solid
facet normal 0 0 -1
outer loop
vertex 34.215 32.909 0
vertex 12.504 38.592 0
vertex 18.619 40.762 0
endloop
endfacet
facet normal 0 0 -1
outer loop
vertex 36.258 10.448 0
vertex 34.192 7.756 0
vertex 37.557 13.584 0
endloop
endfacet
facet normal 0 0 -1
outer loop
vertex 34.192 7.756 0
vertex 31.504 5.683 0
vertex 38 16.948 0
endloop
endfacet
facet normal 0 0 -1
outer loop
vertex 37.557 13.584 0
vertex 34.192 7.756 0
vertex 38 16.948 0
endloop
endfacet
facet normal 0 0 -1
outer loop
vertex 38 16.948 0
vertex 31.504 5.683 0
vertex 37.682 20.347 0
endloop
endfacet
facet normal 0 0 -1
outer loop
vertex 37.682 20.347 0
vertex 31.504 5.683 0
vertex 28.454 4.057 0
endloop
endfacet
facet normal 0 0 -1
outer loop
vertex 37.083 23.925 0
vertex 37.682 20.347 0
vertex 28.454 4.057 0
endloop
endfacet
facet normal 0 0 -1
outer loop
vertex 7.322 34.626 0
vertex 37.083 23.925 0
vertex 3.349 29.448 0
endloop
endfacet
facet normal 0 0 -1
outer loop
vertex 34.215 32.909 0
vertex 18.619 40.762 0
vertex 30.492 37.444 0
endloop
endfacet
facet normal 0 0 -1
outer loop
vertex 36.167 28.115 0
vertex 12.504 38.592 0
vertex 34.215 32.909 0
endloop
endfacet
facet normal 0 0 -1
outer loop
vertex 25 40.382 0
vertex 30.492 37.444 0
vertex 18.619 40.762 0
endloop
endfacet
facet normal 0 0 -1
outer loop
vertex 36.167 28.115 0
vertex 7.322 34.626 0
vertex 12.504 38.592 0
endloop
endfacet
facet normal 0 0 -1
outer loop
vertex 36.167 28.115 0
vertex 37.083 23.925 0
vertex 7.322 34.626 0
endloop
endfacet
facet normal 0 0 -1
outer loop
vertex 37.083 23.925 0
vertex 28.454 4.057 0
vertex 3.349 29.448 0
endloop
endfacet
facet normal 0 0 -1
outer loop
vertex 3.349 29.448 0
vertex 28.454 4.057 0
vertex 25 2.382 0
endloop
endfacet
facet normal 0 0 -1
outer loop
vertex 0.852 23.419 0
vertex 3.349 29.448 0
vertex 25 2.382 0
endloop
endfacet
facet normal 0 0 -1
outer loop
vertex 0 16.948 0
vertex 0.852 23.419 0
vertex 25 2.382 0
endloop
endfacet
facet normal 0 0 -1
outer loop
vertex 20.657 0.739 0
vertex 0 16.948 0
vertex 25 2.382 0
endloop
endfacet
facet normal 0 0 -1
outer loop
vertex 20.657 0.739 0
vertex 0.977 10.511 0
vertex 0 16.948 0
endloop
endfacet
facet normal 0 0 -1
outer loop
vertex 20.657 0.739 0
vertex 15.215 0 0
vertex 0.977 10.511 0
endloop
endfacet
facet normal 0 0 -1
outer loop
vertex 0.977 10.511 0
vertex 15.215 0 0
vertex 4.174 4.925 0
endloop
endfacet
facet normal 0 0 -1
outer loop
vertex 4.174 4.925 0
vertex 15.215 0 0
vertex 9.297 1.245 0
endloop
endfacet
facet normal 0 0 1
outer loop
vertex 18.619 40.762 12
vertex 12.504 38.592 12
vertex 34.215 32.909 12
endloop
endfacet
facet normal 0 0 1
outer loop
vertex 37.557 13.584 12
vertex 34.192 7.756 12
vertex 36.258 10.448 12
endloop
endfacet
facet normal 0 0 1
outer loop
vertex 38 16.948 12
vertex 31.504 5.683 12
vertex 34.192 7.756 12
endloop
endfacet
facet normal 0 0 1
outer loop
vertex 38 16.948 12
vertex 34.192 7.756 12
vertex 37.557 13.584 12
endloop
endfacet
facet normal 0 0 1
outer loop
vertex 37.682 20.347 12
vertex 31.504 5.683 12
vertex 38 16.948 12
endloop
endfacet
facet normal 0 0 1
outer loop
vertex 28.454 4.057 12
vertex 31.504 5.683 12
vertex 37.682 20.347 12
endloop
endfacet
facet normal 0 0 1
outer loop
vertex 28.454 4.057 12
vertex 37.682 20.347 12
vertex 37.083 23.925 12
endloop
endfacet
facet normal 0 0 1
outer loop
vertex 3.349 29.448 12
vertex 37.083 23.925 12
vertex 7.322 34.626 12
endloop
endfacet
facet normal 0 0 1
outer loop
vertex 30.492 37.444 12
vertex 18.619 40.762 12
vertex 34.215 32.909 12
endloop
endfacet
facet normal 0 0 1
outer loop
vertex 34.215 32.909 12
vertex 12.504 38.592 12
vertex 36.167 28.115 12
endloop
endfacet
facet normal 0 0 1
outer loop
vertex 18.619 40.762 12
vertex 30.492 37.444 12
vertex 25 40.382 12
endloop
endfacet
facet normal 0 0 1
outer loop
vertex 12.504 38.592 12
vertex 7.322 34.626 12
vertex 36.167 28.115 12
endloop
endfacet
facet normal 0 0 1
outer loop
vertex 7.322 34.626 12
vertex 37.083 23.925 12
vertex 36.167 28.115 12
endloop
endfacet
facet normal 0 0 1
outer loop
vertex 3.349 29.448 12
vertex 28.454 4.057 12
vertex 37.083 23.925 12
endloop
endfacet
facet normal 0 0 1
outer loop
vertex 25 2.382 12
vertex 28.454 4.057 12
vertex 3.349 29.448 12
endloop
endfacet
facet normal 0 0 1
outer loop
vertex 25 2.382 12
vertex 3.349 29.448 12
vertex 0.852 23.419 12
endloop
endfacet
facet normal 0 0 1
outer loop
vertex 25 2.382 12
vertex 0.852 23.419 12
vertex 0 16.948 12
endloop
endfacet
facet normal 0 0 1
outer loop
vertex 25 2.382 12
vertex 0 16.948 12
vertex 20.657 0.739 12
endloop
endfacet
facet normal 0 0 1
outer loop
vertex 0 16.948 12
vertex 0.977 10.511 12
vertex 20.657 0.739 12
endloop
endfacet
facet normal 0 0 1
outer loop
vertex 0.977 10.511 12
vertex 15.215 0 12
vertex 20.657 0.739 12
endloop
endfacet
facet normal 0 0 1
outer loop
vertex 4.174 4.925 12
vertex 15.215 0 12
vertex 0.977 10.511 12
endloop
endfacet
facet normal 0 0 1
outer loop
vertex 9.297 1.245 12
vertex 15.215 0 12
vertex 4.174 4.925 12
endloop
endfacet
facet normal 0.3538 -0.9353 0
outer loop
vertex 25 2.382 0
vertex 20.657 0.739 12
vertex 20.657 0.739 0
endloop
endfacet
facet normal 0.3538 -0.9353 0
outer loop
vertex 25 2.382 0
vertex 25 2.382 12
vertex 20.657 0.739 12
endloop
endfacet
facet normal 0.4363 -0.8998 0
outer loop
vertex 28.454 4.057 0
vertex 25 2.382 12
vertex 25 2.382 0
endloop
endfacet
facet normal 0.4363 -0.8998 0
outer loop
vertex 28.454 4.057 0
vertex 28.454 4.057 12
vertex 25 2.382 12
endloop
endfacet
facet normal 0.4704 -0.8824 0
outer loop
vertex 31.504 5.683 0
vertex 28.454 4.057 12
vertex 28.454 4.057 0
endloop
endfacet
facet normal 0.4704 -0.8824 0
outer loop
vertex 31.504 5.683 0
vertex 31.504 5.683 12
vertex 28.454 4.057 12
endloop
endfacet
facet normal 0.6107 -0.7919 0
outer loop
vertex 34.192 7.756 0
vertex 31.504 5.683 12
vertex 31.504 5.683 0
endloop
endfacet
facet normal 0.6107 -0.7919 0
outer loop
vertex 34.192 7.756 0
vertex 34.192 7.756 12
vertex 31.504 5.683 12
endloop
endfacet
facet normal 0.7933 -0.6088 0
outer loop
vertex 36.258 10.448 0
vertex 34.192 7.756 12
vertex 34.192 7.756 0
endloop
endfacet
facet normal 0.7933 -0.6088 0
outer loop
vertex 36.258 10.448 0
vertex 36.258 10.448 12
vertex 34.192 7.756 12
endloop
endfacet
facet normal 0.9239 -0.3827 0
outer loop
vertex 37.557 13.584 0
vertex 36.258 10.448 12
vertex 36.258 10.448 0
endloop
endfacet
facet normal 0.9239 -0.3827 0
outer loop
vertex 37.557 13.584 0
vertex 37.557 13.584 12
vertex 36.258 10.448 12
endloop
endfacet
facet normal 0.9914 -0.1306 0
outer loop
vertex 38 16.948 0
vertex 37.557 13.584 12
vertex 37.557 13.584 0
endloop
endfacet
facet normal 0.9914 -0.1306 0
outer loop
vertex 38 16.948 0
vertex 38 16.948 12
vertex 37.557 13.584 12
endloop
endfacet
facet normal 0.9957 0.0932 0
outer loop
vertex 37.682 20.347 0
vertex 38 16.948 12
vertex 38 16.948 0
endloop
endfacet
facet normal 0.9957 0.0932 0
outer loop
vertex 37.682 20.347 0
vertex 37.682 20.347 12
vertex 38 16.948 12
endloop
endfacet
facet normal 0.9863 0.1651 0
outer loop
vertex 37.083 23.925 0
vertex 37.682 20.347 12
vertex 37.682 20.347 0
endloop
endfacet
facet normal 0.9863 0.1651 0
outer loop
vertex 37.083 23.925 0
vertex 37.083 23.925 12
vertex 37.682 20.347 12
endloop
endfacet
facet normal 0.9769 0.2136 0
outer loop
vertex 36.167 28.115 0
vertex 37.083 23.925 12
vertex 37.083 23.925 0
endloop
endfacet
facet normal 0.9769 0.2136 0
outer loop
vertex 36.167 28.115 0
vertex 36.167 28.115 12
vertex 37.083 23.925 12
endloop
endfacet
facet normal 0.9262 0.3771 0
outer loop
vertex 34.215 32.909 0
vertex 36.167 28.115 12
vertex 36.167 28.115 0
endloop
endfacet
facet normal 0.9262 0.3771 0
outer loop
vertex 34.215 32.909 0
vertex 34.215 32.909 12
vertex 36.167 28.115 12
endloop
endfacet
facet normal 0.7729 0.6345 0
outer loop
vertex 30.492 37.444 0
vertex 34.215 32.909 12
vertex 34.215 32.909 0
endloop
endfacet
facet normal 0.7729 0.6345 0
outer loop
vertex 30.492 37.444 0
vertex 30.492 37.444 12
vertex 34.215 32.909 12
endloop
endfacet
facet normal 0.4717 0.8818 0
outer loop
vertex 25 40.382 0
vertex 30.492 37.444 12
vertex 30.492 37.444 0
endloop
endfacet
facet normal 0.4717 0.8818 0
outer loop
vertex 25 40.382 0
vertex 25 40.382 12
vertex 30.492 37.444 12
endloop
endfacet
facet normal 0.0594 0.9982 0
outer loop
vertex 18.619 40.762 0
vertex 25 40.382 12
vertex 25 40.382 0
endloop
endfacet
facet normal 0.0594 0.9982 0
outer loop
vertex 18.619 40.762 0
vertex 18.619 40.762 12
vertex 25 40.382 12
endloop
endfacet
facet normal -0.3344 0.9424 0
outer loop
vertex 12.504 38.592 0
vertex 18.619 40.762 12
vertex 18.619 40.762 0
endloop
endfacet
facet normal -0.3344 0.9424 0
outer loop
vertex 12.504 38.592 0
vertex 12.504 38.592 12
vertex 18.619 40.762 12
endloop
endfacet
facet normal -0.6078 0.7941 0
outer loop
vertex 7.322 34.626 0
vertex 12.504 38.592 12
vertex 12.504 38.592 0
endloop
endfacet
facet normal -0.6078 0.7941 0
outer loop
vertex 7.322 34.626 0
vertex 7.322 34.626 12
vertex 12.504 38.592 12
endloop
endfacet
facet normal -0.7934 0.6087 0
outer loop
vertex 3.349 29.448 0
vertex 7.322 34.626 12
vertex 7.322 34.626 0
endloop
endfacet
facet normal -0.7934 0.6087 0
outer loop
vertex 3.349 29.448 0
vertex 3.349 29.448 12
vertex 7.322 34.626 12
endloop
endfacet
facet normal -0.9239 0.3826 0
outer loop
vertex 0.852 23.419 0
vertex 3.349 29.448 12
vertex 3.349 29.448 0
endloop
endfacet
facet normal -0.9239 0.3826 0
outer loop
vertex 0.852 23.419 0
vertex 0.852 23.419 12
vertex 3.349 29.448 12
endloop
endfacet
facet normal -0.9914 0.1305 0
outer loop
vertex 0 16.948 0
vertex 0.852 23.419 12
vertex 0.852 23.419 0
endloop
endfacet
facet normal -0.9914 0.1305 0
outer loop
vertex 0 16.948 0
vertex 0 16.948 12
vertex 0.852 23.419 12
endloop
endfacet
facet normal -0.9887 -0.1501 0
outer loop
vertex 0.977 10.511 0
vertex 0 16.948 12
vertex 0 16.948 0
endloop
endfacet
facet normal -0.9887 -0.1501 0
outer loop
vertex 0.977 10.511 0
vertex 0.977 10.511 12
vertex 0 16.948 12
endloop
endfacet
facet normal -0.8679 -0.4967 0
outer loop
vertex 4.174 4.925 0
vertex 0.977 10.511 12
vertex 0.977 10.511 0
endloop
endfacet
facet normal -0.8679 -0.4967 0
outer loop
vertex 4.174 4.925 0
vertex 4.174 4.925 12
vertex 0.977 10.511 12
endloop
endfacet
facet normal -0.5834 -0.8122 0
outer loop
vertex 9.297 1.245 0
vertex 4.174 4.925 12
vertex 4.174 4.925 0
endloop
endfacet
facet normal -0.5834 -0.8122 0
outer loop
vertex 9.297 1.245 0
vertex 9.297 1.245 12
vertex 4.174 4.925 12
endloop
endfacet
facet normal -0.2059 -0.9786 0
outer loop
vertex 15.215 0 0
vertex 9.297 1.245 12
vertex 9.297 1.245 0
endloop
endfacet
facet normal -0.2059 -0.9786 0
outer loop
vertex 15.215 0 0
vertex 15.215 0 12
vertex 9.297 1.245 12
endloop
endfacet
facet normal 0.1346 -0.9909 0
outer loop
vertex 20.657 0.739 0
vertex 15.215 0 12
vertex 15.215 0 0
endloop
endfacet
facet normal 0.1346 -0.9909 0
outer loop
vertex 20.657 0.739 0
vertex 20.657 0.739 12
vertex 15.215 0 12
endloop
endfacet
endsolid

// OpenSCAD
$fn = 32;

// ----------------------------------------------------------------------
// Cam disc: base radius 13.0 mm, lift 12.0 mm, 24 profile points
// ----------------------------------------------------------------------

// --- parameters (mm) ---
profile_height = 12;      // extrusion height
profile_points = 24;      // points of the closed outline

profile = [[38, 16.948], [37.682, 20.347], [37.083, 23.925], [36.167, 28.115], [34.215, 32.909], [30.492, 37.444], [25, 40.382], [18.619, 40.762], [12.504, 38.592], [7.322, 34.626], [3.349, 29.448], [0.852, 23.419], [0, 16.948], [0.977, 10.511], [4.174, 4.925], [9.297, 1.245], [15.215, 0], [20.657, 0.739], [25, 2.382], [28.454, 4.057], [31.504, 5.683], [34.192, 7.756], [36.258, 10.448], [37.557, 13.584]];  // single closed polygon, 24 points, counter clockwise

// --- the one profile operation ---
linear_extrude(height = profile_height) polygon(points = profile);
